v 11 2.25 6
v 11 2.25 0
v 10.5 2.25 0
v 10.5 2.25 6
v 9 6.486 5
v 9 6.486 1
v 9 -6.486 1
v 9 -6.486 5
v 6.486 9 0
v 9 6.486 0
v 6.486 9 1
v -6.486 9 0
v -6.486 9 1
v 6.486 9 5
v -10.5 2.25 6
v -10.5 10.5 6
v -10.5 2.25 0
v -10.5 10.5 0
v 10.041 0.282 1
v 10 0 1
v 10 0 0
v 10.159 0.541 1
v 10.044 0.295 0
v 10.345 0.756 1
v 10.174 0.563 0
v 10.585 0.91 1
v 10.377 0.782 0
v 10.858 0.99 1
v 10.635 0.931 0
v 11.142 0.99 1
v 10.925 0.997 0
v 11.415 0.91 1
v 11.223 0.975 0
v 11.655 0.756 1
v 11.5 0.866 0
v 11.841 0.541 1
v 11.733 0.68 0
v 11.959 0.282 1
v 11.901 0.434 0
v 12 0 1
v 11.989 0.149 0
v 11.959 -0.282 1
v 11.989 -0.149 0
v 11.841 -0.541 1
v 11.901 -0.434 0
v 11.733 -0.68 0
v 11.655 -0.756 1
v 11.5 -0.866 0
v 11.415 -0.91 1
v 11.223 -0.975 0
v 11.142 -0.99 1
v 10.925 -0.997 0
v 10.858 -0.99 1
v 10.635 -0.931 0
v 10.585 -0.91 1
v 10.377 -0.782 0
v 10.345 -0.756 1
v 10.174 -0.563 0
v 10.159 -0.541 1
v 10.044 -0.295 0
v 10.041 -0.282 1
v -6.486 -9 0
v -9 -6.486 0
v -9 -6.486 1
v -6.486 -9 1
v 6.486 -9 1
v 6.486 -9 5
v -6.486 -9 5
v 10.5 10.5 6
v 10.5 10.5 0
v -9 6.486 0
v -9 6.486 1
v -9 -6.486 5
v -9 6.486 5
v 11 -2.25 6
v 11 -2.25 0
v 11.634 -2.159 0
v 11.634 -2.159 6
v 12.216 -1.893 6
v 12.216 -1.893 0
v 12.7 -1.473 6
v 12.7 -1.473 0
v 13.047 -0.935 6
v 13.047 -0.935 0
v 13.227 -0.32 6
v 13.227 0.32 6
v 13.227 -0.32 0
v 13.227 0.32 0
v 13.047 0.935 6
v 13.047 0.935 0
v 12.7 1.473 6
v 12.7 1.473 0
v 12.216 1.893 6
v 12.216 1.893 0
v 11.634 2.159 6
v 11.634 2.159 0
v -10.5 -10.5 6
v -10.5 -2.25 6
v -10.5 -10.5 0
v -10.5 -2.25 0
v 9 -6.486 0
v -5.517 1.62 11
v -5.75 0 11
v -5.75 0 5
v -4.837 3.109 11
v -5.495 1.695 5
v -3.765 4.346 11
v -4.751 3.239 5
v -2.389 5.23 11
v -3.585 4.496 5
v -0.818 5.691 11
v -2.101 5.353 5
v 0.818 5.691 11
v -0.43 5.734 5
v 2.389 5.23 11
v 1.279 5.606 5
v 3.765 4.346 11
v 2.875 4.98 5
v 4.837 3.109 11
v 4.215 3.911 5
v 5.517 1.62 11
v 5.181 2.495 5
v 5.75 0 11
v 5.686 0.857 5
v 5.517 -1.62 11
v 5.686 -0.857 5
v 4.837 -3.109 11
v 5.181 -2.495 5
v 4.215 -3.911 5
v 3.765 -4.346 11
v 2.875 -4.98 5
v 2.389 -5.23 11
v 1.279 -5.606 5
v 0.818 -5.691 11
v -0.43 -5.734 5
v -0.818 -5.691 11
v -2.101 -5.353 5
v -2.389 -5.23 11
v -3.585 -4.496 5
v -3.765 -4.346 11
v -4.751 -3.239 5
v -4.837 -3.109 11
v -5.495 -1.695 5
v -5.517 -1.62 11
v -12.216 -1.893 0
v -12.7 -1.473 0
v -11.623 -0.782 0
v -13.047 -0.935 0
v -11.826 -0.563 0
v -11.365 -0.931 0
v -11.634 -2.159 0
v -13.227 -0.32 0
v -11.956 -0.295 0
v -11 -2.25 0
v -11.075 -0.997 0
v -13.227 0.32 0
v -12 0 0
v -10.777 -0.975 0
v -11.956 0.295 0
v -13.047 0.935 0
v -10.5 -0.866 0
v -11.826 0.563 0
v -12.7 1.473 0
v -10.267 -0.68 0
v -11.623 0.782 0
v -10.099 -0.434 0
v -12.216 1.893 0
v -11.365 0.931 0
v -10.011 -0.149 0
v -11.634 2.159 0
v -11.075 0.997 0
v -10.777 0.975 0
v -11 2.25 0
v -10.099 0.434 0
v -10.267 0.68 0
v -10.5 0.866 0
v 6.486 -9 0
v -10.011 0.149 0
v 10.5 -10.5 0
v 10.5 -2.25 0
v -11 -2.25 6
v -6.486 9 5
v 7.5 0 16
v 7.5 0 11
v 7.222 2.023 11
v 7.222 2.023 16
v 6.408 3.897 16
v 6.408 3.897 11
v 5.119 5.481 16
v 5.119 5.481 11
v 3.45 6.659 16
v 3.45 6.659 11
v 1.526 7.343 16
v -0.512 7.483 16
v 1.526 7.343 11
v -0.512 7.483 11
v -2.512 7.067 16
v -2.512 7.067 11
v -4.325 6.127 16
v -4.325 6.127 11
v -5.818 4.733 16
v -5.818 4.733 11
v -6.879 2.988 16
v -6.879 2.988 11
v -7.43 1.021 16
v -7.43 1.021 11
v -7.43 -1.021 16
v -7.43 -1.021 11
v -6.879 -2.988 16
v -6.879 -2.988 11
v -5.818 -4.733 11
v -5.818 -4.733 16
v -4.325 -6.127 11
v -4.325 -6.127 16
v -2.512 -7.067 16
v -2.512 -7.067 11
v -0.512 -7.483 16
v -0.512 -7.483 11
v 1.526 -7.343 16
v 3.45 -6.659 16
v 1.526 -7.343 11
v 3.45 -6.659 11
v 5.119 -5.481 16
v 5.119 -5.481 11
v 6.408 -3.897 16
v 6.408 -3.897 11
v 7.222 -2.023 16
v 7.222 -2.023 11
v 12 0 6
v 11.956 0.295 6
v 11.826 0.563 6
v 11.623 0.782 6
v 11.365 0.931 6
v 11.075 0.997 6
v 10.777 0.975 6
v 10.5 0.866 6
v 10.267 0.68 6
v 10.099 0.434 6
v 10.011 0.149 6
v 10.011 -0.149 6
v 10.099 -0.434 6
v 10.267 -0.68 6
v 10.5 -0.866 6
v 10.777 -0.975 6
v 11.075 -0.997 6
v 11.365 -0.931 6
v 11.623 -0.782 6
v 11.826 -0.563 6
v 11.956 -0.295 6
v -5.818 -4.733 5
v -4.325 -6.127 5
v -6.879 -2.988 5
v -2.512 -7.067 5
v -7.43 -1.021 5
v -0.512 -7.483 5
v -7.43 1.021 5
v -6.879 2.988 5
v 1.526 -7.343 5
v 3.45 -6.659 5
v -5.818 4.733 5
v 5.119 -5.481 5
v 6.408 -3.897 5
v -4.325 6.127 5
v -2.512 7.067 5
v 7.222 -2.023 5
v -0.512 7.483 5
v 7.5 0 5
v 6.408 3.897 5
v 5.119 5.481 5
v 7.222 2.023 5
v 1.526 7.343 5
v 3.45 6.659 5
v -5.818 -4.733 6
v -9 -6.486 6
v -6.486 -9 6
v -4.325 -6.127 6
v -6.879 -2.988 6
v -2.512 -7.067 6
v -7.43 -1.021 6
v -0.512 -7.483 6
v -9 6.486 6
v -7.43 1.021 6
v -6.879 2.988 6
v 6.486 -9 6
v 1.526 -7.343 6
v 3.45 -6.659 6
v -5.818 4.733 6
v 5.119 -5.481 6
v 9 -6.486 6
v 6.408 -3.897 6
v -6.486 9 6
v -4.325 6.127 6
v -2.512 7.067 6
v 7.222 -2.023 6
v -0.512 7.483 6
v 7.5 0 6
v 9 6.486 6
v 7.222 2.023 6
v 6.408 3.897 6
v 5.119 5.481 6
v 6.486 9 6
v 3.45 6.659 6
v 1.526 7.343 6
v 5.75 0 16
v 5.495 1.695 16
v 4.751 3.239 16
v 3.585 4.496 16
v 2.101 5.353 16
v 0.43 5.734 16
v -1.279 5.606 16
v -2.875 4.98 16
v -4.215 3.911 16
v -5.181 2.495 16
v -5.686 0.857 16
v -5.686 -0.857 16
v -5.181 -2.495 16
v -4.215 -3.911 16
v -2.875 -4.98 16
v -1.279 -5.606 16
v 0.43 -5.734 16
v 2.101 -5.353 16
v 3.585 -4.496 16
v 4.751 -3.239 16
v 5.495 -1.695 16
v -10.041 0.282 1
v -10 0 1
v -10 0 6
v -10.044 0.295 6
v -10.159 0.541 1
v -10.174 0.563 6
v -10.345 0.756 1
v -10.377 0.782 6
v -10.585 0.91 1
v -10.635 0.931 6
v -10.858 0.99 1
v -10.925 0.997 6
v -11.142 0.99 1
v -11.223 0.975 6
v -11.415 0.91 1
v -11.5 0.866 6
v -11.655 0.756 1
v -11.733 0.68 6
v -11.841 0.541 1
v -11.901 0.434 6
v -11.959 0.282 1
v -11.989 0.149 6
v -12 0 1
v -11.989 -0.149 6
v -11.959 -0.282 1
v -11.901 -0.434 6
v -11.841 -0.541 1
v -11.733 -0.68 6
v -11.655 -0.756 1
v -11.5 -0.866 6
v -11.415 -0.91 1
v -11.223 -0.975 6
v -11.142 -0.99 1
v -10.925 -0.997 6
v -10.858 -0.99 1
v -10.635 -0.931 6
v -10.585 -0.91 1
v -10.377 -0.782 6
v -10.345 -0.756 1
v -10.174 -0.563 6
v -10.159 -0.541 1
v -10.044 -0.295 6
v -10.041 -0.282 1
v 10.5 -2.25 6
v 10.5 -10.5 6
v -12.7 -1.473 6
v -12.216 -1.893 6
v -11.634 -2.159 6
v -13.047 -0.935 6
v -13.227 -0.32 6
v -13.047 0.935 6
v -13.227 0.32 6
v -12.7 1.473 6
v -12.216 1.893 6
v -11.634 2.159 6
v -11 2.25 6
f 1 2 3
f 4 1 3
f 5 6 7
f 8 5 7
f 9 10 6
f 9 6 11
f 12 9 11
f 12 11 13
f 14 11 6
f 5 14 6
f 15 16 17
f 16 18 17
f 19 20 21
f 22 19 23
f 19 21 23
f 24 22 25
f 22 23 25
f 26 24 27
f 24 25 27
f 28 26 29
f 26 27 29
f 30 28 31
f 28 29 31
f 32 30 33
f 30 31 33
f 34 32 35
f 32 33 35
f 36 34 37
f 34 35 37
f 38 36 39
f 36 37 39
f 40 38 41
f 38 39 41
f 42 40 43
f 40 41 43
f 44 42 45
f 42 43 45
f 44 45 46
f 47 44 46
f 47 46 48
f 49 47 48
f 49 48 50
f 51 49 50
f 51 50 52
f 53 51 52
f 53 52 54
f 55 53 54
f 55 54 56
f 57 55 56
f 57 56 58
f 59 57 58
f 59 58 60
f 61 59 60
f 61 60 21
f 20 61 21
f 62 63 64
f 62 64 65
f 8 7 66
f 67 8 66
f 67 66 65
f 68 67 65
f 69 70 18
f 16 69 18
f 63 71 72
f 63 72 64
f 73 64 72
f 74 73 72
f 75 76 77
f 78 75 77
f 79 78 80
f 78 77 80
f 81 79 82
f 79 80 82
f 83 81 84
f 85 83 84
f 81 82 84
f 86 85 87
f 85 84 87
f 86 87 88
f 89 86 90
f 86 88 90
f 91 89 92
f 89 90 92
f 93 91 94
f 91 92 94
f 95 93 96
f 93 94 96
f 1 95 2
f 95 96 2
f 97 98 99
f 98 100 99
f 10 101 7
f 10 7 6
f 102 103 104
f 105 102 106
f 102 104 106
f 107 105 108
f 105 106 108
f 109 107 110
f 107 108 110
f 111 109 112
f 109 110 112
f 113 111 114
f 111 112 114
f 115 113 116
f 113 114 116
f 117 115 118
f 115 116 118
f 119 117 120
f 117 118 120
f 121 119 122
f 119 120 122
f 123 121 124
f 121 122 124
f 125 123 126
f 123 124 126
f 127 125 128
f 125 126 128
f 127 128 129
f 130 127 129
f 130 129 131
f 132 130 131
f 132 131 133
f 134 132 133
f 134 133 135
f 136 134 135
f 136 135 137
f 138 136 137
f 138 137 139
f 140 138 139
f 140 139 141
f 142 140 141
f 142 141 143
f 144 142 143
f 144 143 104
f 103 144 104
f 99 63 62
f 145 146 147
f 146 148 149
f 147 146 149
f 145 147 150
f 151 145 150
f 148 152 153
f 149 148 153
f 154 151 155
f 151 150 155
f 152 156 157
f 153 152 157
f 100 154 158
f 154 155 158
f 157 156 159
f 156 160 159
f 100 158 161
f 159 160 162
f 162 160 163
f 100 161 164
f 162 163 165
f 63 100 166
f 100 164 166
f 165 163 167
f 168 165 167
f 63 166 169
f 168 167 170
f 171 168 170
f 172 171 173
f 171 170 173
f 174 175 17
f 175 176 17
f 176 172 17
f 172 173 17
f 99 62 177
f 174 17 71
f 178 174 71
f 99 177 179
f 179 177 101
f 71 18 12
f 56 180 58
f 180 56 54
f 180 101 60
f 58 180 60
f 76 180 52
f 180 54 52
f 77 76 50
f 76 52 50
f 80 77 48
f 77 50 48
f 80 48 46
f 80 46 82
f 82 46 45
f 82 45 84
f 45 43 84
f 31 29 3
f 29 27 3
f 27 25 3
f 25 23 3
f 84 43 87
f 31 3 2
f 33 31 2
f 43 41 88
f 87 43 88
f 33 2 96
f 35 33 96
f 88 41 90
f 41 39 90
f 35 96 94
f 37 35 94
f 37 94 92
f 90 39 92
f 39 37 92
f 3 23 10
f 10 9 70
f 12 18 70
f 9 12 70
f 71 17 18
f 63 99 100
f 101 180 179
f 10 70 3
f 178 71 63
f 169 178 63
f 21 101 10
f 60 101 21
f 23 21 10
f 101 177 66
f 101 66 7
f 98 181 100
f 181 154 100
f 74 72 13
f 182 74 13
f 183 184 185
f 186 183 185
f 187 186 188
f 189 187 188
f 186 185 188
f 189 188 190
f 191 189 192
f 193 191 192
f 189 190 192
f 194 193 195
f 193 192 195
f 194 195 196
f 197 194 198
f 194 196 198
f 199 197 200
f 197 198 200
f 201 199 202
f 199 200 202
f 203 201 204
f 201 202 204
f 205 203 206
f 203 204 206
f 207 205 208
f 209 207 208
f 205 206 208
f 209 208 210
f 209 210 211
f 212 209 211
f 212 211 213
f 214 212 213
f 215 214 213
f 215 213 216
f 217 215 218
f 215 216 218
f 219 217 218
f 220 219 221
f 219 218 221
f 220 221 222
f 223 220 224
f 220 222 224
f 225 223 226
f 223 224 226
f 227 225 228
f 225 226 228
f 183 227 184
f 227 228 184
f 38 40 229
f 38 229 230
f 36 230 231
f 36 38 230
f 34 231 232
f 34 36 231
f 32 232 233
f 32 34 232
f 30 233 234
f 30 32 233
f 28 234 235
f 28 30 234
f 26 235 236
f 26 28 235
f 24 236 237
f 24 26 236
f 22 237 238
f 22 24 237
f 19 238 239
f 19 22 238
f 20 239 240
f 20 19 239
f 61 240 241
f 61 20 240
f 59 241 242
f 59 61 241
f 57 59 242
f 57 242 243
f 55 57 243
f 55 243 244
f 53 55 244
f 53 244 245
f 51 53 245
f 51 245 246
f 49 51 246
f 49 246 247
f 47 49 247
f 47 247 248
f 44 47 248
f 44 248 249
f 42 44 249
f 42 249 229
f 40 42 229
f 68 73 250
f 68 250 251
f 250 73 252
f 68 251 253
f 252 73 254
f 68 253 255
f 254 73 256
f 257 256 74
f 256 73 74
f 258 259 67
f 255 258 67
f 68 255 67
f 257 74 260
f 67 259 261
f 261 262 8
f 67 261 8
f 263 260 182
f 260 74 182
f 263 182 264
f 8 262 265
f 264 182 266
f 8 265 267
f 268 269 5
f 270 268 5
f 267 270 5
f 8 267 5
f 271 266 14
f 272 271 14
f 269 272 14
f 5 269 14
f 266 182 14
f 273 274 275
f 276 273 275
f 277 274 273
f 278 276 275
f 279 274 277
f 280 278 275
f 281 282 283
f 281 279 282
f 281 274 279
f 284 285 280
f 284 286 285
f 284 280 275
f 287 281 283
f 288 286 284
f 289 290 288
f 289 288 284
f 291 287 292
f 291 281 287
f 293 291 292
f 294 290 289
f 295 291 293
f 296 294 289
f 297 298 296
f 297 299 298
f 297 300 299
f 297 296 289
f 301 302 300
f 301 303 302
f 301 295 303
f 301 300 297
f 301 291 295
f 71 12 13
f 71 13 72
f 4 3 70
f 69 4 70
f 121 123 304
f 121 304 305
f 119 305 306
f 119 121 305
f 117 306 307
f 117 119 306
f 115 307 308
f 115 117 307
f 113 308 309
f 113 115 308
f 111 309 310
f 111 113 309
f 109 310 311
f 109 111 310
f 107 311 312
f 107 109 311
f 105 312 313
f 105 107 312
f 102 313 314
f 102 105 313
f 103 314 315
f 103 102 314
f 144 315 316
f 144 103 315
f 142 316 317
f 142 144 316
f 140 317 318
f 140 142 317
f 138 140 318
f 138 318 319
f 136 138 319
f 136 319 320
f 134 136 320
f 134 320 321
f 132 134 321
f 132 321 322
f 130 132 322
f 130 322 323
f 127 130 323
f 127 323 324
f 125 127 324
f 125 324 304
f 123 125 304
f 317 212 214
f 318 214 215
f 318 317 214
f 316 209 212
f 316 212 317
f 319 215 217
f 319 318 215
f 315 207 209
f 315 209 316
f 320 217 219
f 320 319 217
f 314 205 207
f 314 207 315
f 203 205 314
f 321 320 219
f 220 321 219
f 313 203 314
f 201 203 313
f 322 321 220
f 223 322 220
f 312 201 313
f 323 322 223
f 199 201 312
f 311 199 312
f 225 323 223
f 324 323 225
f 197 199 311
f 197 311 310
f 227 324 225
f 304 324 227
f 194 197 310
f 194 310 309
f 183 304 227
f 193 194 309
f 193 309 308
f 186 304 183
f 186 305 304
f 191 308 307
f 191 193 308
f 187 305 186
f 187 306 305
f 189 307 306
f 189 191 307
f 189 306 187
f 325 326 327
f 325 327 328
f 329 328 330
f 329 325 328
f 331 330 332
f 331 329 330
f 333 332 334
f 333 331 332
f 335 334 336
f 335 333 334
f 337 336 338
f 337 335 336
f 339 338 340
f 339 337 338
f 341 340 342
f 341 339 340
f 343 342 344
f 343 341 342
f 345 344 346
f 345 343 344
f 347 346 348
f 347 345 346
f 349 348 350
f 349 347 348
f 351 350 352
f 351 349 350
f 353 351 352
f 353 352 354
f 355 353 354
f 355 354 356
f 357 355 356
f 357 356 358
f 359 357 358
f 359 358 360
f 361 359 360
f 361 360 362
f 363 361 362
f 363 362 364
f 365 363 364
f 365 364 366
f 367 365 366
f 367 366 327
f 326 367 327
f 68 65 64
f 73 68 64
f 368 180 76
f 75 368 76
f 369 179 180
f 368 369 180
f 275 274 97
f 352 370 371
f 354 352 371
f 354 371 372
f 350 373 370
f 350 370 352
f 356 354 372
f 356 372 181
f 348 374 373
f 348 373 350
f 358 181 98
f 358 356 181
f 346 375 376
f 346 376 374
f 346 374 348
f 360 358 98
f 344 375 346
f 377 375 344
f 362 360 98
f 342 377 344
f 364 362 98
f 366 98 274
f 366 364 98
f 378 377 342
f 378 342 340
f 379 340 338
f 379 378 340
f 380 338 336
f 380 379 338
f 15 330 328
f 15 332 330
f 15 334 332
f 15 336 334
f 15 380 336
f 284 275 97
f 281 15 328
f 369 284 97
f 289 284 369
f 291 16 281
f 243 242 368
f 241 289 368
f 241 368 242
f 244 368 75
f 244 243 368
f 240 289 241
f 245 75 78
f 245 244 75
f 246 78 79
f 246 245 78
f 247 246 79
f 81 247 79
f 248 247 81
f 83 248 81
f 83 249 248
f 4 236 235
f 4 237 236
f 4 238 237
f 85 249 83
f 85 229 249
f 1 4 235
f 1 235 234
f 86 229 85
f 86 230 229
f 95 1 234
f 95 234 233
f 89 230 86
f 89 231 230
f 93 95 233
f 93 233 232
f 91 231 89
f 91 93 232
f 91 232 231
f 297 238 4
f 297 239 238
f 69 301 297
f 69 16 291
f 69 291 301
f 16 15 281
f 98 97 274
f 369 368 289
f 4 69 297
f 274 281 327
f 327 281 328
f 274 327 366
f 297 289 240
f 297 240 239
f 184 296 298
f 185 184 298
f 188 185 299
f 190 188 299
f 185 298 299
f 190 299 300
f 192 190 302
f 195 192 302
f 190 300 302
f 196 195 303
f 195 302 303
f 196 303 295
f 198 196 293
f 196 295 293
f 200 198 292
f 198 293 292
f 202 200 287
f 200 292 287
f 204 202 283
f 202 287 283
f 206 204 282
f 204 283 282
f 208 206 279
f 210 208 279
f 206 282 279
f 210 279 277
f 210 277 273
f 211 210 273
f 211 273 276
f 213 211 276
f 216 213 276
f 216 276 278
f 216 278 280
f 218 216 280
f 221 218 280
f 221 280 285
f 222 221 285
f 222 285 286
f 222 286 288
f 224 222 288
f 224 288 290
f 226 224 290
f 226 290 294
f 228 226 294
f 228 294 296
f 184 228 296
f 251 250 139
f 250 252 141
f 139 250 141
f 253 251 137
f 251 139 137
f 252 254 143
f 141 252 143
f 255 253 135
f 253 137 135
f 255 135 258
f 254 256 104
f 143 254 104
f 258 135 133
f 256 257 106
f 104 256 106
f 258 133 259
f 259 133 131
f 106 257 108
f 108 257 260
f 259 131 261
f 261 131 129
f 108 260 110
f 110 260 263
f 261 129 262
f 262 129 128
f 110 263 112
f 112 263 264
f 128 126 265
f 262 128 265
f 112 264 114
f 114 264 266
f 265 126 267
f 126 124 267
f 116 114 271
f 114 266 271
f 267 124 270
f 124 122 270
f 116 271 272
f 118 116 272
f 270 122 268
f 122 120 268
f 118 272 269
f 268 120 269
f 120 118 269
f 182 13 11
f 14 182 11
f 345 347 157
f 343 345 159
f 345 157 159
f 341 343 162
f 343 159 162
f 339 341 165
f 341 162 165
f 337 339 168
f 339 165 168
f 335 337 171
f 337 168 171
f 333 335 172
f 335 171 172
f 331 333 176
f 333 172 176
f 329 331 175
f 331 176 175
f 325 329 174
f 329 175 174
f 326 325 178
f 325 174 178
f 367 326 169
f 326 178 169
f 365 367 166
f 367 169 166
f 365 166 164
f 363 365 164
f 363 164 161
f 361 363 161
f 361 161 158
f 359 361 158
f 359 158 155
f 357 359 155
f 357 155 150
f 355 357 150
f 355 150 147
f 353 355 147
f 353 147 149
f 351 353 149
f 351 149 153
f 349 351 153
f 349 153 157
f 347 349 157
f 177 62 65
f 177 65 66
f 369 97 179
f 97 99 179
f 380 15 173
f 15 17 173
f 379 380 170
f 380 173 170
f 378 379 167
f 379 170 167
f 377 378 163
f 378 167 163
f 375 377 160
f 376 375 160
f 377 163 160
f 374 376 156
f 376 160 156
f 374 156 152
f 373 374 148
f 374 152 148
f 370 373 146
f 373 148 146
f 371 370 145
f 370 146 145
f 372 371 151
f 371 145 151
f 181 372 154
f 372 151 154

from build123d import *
from build123d.topology import SkipClean

# Parameters (mm, degrees)
BASE_HULL_DEPTH                   = 5
BASE_START                        = 1
BASE_COVER_DEPTH                  = 1
LENS_HOLE_HULL_BASE_SKETCH_R      = 7.5
LENS_HOLE_HULL_DEPTH              = 10
LENS_HOLE_D                       = 11.5
MOUNT_HOLES_D                     = 2
PULL_START                        = -5
PULL_BASE_TO_ORIGIN_OUTLINE_R     = 1
PULL_BASE_TO_ORIGIN_DEPTH         = 5
PULL_BASE_TO_ORIGIN_2_OUTLINE_R   = 5.75
PULL_BASE_TO_ORIGIN_2_DEPTH       = 5
PULL_START_2                      = 1
PULL_BASE_TO_ORIGIN_3_OUTLINE_R   = 1
PULL_BASE_TO_ORIGIN_3_DEPTH       = 5
PULL_START_3                      = 11
PULL_BASE_TO_ORIGIN_4_OUTLINE_R   = 7.5
PULL_BASE_TO_ORIGIN_4_OUTLINE_R_2 = 5.75
PULL_BASE_TO_ORIGIN_4_DEPTH       = 5
PULL_START_4                      = 5
PULL_BASE_TO_ORIGIN_5_OUTLINE_R   = 7.5
PULL_BASE_TO_ORIGIN_5_DEPTH       = 1


# Read off the part's stored shape, not the designer's step: Pull base to origin
with BuildPart() as part:
    # Base sketch → Base hull (new body)
    with BuildSketch(Plane.XY):
        with BuildLine():
            Line((-10.5, 10.5), (10.5, 10.5))
            Line((10.5, 10.5), (10.5, 2.25))
            Line((10.5, 2.25), (11, 2.25))
            ThreePointArc((11, 2.25), (13.25, 0), (11, -2.25))
            Line((11, -2.25), (10.5, -2.25))
            Line((10.5, -2.25), (10.5, -10.5))
            Line((10.5, -10.5), (-10.5, -10.5))
            Line((-10.5, -10.5), (-10.5, -2.25))
            Line((-10.5, -2.25), (-11, -2.25))
            ThreePointArc((-11, -2.25), (-13.25, 0), (-11, 2.25))
            Line((-11, 2.25), (-10.5, 2.25))
            Line((-10.5, 2.25), (-10.5, 10.5))
        make_face()
        Polygon((-9, 6.485638508), (-9, -6.485638508), (-6.485638508, -9), (6.485638508, -9), (9, -6.485638508), (9, 6.485638508), (6.485638508, 9), (-6.485638508, 9), align=None, mode=Mode.SUBTRACT)
    extrude(amount=-BASE_HULL_DEPTH)

    # Base sketch<2> → Base cover (add)
    # profile 1 of 2: a face of its own
    with BuildSketch(Plane.XY.offset(BASE_START)):
        with BuildLine():
            ThreePointArc((11, 2.25), (13.25, 0), (11, -2.25))
            Line((11, -2.25), (10.5, -2.25))
            Line((10.5, -2.25), (10.5, -10.5))
            Line((10.5, -10.5), (-10.5, -10.5))
            Line((-10.5, -10.5), (-10.5, -2.25))
            Line((-10.5, -2.25), (-11, -2.25))
            ThreePointArc((-11, -2.25), (-13.25, 0), (-11, 2.25))
            Line((-11, 2.25), (-10.5, 2.25))
            Line((-10.5, 2.25), (-10.5, 10.5))
            Line((-10.5, 10.5), (10.5, 10.5))
            Line((10.5, 10.5), (10.5, 2.25))
            Line((10.5, 2.25), (11, 2.25))
        make_face()
        Polygon((-6.485638508, 9), (-9, 6.485638508), (-9, -6.485638508), (-6.485638508, -9), (6.485638508, -9), (9, -6.485638508), (9, 6.485638508), (6.485638508, 9), align=None, mode=Mode.SUBTRACT)
    # profile 2 of 2: a face of its own
    with BuildSketch(Plane.XY.offset(BASE_START)):
        Polygon((6.485638508, 9), (-6.485638508, 9), (-9, 6.485638508), (-9, -6.485638508), (-6.485638508, -9), (6.485638508, -9), (9, -6.485638508), (9, 6.485638508), align=None)
    extrude(amount=-BASE_COVER_DEPTH)

    # Lens hole hull base sketch → Lens hole hull (add)
    with BuildSketch(Plane.XY.offset(1)):
        Circle(LENS_HOLE_HULL_BASE_SKETCH_R)
    extrude(amount=LENS_HOLE_HULL_DEPTH)

    # Lens hole (through all)
    with Locations(Plane.XY.offset(11)):
        with Locations((0, 0)):
            Hole(LENS_HOLE_D / 2)

    # Mount holes (through all)
    with Locations(Plane.XY.offset(1)):
        with Locations((-11, 0), (11, 0)):
            Hole(MOUNT_HOLES_D / 2)

    # Pull base to origin outline → Pull base to origin (cut)
    with BuildSketch(Plane.XY.offset(PULL_START)):
        with BuildLine():
            Line((10.5, 10.5), (-10.5, 10.5))
            Line((-10.5, 10.5), (-10.5, 2.25))
            Line((-10.5, 2.25), (-11, 2.25))
            ThreePointArc((-11, 2.25), (-13.25, 0), (-11, -2.25))
            Line((-11, -2.25), (-10.5, -2.25))
            Line((-10.5, -2.25), (-10.5, -10.5))
            Line((-10.5, -10.5), (10.5, -10.5))
            Line((10.5, -10.5), (10.5, -2.25))
            Line((10.5, -2.25), (11, -2.25))
            ThreePointArc((11, -2.25), (13.25, 0), (11, 2.25))
            Line((11, 2.25), (10.5, 2.25))
            Line((10.5, 2.25), (10.5, 10.5))
        make_face()
        with Locations((-11, 0)):
            Circle(PULL_BASE_TO_ORIGIN_OUTLINE_R, mode=Mode.SUBTRACT)
        Polygon((6.485638508, -9), (-6.485638508, -9), (-9, -6.485638508), (-9, 6.485638508), (-6.485638508, 9), (6.485638508, 9), (9, 6.485638508), (9, -6.485638508), align=None, mode=Mode.SUBTRACT)
        with Locations((11, 0)):
            Circle(PULL_BASE_TO_ORIGIN_OUTLINE_R, mode=Mode.SUBTRACT)
    extrude(amount=PULL_BASE_TO_ORIGIN_DEPTH, mode=Mode.SUBTRACT)

    # Pull base to origin 2 outline → Pull base to origin 2 (cut)
    with BuildSketch(Plane.XY):
        Polygon((-9, -6.485638508), (-6.485638508, -9), (6.485638508, -9), (9, -6.485638508), (9, 6.485638508), (6.485638508, 9), (-6.485638508, 9), (-9, 6.485638508), align=None)
        Circle(PULL_BASE_TO_ORIGIN_2_OUTLINE_R, mode=Mode.SUBTRACT)
    extrude(amount=PULL_BASE_TO_ORIGIN_2_DEPTH, mode=Mode.SUBTRACT)

    # Pull base to origin 3 outline → Pull base to origin 3 (add)
    with SkipClean():  # the faces are left unmerged after this step: merging them gives an invalid solid
        with BuildSketch(Plane.XY.offset(PULL_START_2)):
            with BuildLine():
                Line((10.5, 10.5), (-10.5, 10.5))
                Line((-10.5, 10.5), (-10.5, 2.25))
                Line((-10.5, 2.25), (-11, 2.25))
                ThreePointArc((-11, 2.25), (-13.25, 0), (-11, -2.25))
                Line((-11, -2.25), (-10.5, -2.25))
                Line((-10.5, -2.25), (-10.5, -10.5))
                Line((-10.5, -10.5), (10.5, -10.5))
                Line((10.5, -10.5), (10.5, -2.25))
                Line((10.5, -2.25), (11, -2.25))
                ThreePointArc((11, -2.25), (13.25, 0), (11, 2.25))
                Line((11, 2.25), (10.5, 2.25))
                Line((10.5, 2.25), (10.5, 10.5))
            make_face()
            with Locations((-11, 0)):
                Circle(PULL_BASE_TO_ORIGIN_3_OUTLINE_R, mode=Mode.SUBTRACT)
            Polygon((6.485638508, -9), (-6.485638508, -9), (-9, -6.485638508), (-9, 6.485638508), (-6.485638508, 9), (6.485638508, 9), (9, 6.485638508), (9, -6.485638508), align=None, mode=Mode.SUBTRACT)
            with Locations((11, 0)):
                Circle(PULL_BASE_TO_ORIGIN_3_OUTLINE_R, mode=Mode.SUBTRACT)
        extrude(amount=PULL_BASE_TO_ORIGIN_3_DEPTH)
    add(part.part.scale(1), mode=Mode.REPLACE)  # the faces are merged on a copy

    # Pull base to origin 4 outline → Pull base to origin 4 (add)
    with SkipClean():  # the faces are left unmerged after this step: merging them gives an invalid solid
        with BuildSketch(Plane.XY.offset(PULL_START_3)):
            Circle(PULL_BASE_TO_ORIGIN_4_OUTLINE_R)
            Circle(PULL_BASE_TO_ORIGIN_4_OUTLINE_R_2, mode=Mode.SUBTRACT)
        extrude(amount=PULL_BASE_TO_ORIGIN_4_DEPTH)

    # Pull base to origin 5 outline → Pull base to origin 5 (add)
    with SkipClean():  # the faces are left unmerged after this step: merging them gives an invalid solid
        with BuildSketch(Plane.XY.offset(PULL_START_4)):
            Polygon((-9, -6.485638508), (-6.485638508, -9), (6.485638508, -9), (9, -6.485638508), (9, 6.485638508), (6.485638508, 9), (-6.485638508, 9), (-9, 6.485638508), align=None)
            Circle(PULL_BASE_TO_ORIGIN_5_OUTLINE_R, mode=Mode.SUBTRACT)
        extrude(amount=PULL_BASE_TO_ORIGIN_5_DEPTH)


solid = part.part
